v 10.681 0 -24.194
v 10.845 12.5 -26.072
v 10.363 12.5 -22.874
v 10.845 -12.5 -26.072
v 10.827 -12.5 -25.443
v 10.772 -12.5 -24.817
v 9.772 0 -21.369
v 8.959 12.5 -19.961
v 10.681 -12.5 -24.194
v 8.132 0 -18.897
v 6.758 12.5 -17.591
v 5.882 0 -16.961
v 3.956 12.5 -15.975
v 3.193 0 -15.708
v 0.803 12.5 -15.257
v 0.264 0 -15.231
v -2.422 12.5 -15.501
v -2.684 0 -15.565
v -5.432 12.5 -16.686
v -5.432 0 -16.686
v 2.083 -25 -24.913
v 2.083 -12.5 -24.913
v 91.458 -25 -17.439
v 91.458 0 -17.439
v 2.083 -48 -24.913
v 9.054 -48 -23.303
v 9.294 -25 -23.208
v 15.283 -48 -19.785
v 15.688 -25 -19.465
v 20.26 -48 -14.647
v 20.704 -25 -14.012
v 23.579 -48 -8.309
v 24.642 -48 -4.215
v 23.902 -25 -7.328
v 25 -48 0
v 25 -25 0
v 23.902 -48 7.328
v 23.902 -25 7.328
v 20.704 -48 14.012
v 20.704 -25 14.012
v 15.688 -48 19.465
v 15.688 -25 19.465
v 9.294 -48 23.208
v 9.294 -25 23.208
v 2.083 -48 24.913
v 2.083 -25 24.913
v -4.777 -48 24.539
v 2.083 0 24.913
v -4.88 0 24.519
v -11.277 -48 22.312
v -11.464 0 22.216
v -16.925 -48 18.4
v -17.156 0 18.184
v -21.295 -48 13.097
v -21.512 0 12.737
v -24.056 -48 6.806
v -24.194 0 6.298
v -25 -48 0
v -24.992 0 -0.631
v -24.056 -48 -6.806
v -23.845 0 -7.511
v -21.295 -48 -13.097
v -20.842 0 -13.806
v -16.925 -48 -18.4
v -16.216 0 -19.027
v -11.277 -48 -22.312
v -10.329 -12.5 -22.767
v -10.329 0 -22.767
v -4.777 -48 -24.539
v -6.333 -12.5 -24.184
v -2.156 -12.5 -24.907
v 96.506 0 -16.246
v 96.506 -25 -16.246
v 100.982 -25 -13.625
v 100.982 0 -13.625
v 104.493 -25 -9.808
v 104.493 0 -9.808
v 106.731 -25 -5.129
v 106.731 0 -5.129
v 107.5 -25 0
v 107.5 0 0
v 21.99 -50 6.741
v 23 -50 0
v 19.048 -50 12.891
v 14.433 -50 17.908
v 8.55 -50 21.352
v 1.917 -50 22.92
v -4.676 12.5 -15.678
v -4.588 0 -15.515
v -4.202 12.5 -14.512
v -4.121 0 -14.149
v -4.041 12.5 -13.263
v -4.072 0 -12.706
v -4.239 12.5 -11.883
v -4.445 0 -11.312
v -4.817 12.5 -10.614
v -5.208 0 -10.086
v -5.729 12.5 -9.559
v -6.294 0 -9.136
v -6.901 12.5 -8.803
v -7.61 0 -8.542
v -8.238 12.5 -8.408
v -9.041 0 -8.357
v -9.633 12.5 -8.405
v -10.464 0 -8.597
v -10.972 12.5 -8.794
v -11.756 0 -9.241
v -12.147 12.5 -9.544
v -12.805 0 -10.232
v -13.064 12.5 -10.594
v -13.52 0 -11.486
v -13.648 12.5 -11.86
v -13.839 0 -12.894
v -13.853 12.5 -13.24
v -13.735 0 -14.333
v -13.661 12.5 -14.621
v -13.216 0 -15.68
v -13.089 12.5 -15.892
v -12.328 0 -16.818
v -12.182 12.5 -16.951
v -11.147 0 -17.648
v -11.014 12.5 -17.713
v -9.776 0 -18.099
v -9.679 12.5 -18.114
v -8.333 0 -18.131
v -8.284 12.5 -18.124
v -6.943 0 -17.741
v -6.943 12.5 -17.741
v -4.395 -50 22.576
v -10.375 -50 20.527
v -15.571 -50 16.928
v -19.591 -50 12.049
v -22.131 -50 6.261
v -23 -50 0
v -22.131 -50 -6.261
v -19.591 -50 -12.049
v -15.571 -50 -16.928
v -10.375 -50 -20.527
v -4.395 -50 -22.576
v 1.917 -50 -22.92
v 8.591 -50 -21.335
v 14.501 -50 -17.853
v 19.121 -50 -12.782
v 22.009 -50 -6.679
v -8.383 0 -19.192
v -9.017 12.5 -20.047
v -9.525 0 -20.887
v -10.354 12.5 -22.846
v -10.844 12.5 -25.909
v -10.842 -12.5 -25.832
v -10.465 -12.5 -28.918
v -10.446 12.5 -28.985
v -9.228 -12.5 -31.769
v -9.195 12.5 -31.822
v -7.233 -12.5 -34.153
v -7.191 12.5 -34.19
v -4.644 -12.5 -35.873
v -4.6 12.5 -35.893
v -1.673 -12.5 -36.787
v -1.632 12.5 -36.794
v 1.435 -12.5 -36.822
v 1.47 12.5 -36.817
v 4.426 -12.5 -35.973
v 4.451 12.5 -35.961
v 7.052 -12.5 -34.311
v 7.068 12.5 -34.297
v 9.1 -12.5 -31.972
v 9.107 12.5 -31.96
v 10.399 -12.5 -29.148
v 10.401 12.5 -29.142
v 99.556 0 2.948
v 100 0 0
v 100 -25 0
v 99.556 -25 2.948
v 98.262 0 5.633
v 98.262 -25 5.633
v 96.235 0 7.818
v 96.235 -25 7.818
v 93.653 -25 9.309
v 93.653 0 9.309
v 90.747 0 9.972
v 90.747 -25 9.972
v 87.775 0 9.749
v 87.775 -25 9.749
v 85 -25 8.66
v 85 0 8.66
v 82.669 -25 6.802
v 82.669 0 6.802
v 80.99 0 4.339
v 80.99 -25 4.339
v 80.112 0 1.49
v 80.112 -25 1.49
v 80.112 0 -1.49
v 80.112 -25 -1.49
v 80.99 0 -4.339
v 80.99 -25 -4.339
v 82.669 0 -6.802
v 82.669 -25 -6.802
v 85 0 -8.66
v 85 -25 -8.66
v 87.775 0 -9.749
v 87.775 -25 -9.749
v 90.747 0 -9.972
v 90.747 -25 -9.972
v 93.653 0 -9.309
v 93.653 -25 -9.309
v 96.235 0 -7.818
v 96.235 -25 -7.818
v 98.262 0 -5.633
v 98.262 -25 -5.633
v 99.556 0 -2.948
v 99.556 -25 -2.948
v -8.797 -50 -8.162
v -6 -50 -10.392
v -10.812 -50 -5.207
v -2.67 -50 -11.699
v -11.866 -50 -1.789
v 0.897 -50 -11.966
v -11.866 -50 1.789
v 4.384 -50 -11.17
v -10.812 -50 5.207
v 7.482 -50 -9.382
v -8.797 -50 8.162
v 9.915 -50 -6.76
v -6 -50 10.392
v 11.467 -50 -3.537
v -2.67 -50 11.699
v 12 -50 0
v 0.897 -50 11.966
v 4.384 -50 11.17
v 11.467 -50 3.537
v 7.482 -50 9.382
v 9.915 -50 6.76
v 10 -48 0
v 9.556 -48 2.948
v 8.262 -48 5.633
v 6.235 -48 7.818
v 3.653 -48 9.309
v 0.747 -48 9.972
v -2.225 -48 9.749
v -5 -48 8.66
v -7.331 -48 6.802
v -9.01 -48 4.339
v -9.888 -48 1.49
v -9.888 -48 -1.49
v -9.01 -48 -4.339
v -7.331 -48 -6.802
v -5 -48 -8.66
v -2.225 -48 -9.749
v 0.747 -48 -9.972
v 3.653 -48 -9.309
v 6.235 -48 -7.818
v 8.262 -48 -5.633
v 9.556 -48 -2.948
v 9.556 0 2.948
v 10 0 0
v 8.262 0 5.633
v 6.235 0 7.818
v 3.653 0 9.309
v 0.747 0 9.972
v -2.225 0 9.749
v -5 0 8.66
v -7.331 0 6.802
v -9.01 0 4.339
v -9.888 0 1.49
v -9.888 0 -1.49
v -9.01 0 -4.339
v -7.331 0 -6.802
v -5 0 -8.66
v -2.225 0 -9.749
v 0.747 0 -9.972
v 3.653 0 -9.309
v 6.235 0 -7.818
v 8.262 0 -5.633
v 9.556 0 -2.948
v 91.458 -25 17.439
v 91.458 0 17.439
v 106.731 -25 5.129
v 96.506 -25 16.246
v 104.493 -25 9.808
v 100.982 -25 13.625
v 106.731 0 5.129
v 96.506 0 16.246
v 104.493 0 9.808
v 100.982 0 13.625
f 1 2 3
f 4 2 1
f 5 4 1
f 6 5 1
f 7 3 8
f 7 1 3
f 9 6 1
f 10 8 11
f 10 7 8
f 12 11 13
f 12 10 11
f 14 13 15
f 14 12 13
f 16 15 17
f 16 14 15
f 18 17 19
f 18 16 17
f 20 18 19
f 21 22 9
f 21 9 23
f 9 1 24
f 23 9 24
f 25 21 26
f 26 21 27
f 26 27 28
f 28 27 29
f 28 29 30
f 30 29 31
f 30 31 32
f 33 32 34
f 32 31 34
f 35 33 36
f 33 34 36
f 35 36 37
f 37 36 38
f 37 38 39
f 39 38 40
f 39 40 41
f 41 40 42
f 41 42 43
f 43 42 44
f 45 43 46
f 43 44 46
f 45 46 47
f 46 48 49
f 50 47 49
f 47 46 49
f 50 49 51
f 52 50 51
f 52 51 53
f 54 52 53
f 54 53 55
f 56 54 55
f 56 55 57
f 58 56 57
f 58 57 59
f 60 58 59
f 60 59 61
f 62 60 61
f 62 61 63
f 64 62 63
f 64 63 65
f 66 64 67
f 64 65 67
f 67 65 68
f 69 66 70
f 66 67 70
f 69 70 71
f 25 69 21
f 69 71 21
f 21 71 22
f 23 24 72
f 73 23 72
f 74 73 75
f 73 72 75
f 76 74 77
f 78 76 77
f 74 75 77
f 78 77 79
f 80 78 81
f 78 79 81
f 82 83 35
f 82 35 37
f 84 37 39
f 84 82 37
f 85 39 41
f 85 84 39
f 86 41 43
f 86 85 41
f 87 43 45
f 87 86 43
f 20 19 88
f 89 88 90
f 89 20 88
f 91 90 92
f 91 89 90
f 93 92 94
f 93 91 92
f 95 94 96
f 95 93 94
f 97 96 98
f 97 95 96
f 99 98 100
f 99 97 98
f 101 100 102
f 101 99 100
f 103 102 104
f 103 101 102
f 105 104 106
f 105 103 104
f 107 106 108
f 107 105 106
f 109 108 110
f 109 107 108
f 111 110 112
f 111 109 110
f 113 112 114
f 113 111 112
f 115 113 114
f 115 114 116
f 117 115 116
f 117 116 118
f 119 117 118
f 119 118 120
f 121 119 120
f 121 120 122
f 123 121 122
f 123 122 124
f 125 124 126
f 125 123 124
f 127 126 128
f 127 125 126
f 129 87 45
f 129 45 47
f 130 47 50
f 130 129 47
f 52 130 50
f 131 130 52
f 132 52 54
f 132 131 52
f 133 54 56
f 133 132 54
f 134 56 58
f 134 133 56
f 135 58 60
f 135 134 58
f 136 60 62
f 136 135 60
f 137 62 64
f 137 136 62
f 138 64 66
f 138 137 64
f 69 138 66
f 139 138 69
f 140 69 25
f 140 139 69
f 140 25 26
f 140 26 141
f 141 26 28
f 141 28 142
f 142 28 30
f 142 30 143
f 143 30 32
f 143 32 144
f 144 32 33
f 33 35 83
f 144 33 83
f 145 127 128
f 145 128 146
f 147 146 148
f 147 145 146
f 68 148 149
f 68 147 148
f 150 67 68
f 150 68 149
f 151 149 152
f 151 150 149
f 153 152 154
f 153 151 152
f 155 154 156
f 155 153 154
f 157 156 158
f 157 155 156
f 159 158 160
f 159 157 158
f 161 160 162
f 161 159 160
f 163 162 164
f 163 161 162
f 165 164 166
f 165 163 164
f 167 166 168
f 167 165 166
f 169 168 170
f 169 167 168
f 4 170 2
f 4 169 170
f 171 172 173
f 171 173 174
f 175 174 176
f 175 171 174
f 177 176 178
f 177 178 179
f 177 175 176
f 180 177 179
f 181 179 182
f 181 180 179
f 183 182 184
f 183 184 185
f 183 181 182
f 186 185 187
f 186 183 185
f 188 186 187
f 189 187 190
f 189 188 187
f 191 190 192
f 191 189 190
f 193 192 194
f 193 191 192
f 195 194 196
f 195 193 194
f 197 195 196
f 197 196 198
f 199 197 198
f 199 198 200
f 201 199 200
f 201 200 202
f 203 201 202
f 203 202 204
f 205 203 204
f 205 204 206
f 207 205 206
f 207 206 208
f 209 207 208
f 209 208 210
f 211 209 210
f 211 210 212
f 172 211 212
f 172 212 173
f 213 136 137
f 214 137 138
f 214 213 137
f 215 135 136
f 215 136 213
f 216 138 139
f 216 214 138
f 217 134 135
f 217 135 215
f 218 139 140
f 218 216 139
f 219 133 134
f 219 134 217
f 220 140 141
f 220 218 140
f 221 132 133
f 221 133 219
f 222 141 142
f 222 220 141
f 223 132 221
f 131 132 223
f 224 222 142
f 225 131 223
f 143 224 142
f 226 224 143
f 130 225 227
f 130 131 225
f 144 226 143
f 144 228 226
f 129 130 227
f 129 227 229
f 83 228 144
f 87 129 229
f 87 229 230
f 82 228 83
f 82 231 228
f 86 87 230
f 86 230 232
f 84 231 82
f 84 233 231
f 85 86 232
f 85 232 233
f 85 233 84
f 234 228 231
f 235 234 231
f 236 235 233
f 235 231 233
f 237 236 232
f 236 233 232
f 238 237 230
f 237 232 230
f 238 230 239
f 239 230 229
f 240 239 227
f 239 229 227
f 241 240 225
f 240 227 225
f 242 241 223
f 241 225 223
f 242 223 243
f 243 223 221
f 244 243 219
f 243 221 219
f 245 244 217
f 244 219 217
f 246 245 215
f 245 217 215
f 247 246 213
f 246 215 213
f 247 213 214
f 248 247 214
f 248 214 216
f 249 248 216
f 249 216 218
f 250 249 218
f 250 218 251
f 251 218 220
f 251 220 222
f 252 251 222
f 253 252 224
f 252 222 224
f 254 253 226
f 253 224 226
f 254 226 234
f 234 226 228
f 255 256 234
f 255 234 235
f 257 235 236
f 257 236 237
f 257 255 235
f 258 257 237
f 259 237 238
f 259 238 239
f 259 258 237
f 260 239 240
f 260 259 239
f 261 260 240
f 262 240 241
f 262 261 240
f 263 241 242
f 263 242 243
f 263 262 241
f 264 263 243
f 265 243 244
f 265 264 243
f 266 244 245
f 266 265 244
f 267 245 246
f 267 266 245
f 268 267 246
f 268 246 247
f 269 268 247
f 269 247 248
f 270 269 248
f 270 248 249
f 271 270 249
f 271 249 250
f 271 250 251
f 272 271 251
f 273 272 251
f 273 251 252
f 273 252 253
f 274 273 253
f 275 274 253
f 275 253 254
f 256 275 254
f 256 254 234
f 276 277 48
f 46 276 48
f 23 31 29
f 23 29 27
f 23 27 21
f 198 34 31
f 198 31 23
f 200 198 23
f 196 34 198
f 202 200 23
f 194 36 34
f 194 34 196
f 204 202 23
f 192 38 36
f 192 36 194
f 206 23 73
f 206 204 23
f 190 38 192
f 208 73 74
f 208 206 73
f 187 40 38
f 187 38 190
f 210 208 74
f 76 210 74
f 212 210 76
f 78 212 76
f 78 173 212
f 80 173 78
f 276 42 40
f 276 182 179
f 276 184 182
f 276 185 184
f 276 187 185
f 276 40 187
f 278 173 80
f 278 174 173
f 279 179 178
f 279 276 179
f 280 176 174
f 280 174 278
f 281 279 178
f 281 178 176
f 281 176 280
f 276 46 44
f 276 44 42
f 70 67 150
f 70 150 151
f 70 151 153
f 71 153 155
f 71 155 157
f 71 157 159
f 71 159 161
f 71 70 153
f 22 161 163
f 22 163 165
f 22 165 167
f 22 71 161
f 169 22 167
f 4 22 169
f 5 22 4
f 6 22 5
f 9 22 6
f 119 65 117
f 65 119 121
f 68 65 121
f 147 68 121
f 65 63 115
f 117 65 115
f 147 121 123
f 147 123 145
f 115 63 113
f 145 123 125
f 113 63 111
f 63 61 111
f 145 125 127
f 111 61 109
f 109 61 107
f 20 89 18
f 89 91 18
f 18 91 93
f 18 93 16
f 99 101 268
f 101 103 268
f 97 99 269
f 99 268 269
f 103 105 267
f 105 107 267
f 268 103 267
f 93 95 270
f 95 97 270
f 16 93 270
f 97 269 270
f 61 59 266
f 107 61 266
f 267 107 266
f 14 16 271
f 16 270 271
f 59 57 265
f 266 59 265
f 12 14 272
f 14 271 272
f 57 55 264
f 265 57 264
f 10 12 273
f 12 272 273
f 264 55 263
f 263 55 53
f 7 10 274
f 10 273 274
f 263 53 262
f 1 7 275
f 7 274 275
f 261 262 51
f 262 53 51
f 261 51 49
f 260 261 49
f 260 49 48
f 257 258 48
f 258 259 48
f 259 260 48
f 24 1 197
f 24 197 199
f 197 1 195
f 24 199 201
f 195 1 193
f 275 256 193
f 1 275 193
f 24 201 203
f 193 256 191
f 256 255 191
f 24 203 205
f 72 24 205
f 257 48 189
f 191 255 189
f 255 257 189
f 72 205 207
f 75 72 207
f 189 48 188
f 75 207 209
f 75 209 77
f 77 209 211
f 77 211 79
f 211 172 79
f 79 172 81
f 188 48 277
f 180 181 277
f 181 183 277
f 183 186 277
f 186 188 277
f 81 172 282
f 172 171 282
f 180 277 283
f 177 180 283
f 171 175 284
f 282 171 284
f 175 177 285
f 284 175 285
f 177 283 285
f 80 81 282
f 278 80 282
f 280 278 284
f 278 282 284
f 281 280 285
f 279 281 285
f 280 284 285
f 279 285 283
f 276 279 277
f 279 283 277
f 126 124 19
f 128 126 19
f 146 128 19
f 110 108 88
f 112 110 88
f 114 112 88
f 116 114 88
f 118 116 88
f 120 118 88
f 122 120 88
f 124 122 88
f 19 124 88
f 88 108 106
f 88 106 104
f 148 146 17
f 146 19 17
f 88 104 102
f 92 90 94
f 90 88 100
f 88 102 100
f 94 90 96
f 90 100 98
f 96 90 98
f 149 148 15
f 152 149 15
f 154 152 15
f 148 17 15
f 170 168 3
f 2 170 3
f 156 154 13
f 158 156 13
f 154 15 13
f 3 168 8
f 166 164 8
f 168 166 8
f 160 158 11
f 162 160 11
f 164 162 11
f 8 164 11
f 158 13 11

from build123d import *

# Parameters (mm, degrees)
F0_R     = 10
F1_DEPTH = 25
F2_DEPTH = 50
F3_SIZE  = 2
F5_DEPTH = 12.5
F6_DEPTH = 25


with BuildPart() as f1:
    # F0 (on Front) → F1 (new body)
    with BuildSketch(Plane.XZ):
        with BuildLine():
            ThreePointArc((2.0833333333, -24.9130432148), (18.3995018048, -16.9250800097), (25, 0))
            ThreePointArc((25, 0), (18.3995018048, 16.9250800097), (2.0833333333, 24.9130432148))
            ThreePointArc((2.0833333333, 24.9130432148), (-25, 0), (2.0833333333, -24.9130432148))
        make_face()
        Circle(F0_R, mode=Mode.SUBTRACT)
        with BuildLine():
            ThreePointArc((2.0833333333, 24.9130432148), (18.3995018048, 16.9250800097), (25, 0))
            ThreePointArc((25, 0), (18.3995018048, -16.9250800097), (2.0833333333, -24.9130432148))
            Line((2.0833333333, -24.9130432148), (91.4583333333, -17.4391302504))
            ThreePointArc((91.4583333333, -17.4391302504), (72.5, 0), (91.4583333333, 17.4391302504))
            Line((91.4583333333, 17.4391302504), (2.0833333333, 24.9130432148))
        make_face()
        with BuildLine():
            ThreePointArc((107.5, 0), (102.8796512634, 11.8475560068), (91.4583333333, 17.4391302504))
            ThreePointArc((91.4583333333, 17.4391302504), (72.5, 0), (91.4583333333, -17.4391302504))
            ThreePointArc((91.4583333333, -17.4391302504), (102.8796512634, -11.8475560068), (107.5, 0))
        make_face()
        with Locations((90, 0)):
            Circle(F0_R, mode=Mode.SUBTRACT)
    extrude(amount=F1_DEPTH)

    # F0 (on Front) → F2 (join)
    with BuildSketch(Plane.XZ):
        with BuildLine():
            ThreePointArc((2.0833333333, -24.9130432148), (18.3995018048, -16.9250800097), (25, 0))
            ThreePointArc((25, 0), (18.3995018048, 16.9250800097), (2.0833333333, 24.9130432148))
            ThreePointArc((2.0833333333, 24.9130432148), (-25, 0), (2.0833333333, -24.9130432148))
        make_face()
        Circle(F0_R, mode=Mode.SUBTRACT)
    extrude(amount=F2_DEPTH)

    # F3
    f3_edges = [f1.edges().sort_by_distance(p)[0] for p in [
        (-2.083333, -50, 24.913043),
        (-10, -50, 0),
        (80, -25, 0),
    ]]
    chamfer(f3_edges, length=F3_SIZE)

    # F4 (on face) → F5 (join, symmetric)
    with BuildSketch(Plane.XZ):
        with BuildLine():
            ThreePointArc((-5.4315853461, -16.6855811303), (-4.4015799273, -15.1101718832), (-4.0405321611, -13.2628846914))
            ThreePointArc((-4.0405321611, -13.2628846914), (-13.0639901523, -10.5943657369), (-6.9433212415, -17.7414770144))
            ThreePointArc((-6.9433212415, -17.7414770144), (-6.2099361746, -17.1813401242), (-5.4315853461, -16.6855811303))
        make_face()
        with BuildLine():
            ThreePointArc((-5.4315853461, -16.6855811303), (-6.2099361746, -17.1813401242), (-6.9433212415, -17.7414770144))
            ThreePointArc((-6.9433212415, -17.7414770144), (-6.1374016791, -17.2851884317), (-5.4315853461, -16.6855811303))
        make_face()
        with BuildLine():
            ThreePointArc((-5.4315853461, -16.6855811303), (-6.1374016791, -17.2851884317), (-6.9433212415, -17.7414770144))
            ThreePointArc((-6.9433212415, -17.7414770144), (-4.5995107108, -35.8932904795), (10.8448163239, -26.0721631348))
            ThreePointArc((10.8448163239, -26.0721631348), (5.4178176267, -16.6776278476), (-5.4315853461, -16.6855811303))
        make_face()
    extrude(amount=F5_DEPTH, both=True)

    # F0 (on Front) + F5_face (on face) → F6 (join)
    with BuildSketch(Plane.XZ):
        with BuildLine():
            ThreePointArc((2.0833333333, -24.9130432148), (18.3995018048, -16.9250800097), (25, 0))
            ThreePointArc((25, 0), (18.3995018048, 16.9250800097), (2.0833333333, 24.9130432148))
            ThreePointArc((2.0833333333, 24.9130432148), (-25, 0), (2.0833333333, -24.9130432148))
        make_face()
        Circle(F0_R, mode=Mode.SUBTRACT)
        with BuildLine():
            ThreePointArc((2.0833333333, 24.9130432148), (18.3995018048, 16.9250800097), (25, 0))
            ThreePointArc((25, 0), (18.3995018048, -16.9250800097), (2.0833333333, -24.9130432148))
            Line((2.0833333333, -24.9130432148), (91.4583333333, -17.4391302504))
            ThreePointArc((91.4583333333, -17.4391302504), (72.5, 0), (91.4583333333, 17.4391302504))
            Line((91.4583333333, 17.4391302504), (2.0833333333, 24.9130432148))
        make_face()
        with BuildLine():
            ThreePointArc((107.5, 0), (102.8796512634, 11.8475560068), (91.4583333333, 17.4391302504))
            ThreePointArc((91.4583333333, 17.4391302504), (72.5, 0), (91.4583333333, -17.4391302504))
            ThreePointArc((91.4583333333, -17.4391302504), (102.8796512634, -11.8475560068), (107.5, 0))
        make_face()
        with Locations((90, 0)):
            Circle(F0_R, mode=Mode.SUBTRACT)
    with BuildSketch(Plane(origin=(-1.518445143, 12.5, -23.8981911908), x_dir=(1, 0, 0), z_dir=(0, 1, 0))):
        with BuildLine():
            ThreePointArc((-3.9131402031, -7.2126100605), (7.7283813175, 11.0647949546), (-5.4248760985, -6.1567141764))
            ThreePointArc((-5.4248760985, -6.1567141764), (-10.2378400686, -14.6576102398), (-3.9131402031, -7.2126100605))
        make_face()
    extrude(amount=F6_DEPTH, dir=(0, -1, 0))


solid = f1.part
